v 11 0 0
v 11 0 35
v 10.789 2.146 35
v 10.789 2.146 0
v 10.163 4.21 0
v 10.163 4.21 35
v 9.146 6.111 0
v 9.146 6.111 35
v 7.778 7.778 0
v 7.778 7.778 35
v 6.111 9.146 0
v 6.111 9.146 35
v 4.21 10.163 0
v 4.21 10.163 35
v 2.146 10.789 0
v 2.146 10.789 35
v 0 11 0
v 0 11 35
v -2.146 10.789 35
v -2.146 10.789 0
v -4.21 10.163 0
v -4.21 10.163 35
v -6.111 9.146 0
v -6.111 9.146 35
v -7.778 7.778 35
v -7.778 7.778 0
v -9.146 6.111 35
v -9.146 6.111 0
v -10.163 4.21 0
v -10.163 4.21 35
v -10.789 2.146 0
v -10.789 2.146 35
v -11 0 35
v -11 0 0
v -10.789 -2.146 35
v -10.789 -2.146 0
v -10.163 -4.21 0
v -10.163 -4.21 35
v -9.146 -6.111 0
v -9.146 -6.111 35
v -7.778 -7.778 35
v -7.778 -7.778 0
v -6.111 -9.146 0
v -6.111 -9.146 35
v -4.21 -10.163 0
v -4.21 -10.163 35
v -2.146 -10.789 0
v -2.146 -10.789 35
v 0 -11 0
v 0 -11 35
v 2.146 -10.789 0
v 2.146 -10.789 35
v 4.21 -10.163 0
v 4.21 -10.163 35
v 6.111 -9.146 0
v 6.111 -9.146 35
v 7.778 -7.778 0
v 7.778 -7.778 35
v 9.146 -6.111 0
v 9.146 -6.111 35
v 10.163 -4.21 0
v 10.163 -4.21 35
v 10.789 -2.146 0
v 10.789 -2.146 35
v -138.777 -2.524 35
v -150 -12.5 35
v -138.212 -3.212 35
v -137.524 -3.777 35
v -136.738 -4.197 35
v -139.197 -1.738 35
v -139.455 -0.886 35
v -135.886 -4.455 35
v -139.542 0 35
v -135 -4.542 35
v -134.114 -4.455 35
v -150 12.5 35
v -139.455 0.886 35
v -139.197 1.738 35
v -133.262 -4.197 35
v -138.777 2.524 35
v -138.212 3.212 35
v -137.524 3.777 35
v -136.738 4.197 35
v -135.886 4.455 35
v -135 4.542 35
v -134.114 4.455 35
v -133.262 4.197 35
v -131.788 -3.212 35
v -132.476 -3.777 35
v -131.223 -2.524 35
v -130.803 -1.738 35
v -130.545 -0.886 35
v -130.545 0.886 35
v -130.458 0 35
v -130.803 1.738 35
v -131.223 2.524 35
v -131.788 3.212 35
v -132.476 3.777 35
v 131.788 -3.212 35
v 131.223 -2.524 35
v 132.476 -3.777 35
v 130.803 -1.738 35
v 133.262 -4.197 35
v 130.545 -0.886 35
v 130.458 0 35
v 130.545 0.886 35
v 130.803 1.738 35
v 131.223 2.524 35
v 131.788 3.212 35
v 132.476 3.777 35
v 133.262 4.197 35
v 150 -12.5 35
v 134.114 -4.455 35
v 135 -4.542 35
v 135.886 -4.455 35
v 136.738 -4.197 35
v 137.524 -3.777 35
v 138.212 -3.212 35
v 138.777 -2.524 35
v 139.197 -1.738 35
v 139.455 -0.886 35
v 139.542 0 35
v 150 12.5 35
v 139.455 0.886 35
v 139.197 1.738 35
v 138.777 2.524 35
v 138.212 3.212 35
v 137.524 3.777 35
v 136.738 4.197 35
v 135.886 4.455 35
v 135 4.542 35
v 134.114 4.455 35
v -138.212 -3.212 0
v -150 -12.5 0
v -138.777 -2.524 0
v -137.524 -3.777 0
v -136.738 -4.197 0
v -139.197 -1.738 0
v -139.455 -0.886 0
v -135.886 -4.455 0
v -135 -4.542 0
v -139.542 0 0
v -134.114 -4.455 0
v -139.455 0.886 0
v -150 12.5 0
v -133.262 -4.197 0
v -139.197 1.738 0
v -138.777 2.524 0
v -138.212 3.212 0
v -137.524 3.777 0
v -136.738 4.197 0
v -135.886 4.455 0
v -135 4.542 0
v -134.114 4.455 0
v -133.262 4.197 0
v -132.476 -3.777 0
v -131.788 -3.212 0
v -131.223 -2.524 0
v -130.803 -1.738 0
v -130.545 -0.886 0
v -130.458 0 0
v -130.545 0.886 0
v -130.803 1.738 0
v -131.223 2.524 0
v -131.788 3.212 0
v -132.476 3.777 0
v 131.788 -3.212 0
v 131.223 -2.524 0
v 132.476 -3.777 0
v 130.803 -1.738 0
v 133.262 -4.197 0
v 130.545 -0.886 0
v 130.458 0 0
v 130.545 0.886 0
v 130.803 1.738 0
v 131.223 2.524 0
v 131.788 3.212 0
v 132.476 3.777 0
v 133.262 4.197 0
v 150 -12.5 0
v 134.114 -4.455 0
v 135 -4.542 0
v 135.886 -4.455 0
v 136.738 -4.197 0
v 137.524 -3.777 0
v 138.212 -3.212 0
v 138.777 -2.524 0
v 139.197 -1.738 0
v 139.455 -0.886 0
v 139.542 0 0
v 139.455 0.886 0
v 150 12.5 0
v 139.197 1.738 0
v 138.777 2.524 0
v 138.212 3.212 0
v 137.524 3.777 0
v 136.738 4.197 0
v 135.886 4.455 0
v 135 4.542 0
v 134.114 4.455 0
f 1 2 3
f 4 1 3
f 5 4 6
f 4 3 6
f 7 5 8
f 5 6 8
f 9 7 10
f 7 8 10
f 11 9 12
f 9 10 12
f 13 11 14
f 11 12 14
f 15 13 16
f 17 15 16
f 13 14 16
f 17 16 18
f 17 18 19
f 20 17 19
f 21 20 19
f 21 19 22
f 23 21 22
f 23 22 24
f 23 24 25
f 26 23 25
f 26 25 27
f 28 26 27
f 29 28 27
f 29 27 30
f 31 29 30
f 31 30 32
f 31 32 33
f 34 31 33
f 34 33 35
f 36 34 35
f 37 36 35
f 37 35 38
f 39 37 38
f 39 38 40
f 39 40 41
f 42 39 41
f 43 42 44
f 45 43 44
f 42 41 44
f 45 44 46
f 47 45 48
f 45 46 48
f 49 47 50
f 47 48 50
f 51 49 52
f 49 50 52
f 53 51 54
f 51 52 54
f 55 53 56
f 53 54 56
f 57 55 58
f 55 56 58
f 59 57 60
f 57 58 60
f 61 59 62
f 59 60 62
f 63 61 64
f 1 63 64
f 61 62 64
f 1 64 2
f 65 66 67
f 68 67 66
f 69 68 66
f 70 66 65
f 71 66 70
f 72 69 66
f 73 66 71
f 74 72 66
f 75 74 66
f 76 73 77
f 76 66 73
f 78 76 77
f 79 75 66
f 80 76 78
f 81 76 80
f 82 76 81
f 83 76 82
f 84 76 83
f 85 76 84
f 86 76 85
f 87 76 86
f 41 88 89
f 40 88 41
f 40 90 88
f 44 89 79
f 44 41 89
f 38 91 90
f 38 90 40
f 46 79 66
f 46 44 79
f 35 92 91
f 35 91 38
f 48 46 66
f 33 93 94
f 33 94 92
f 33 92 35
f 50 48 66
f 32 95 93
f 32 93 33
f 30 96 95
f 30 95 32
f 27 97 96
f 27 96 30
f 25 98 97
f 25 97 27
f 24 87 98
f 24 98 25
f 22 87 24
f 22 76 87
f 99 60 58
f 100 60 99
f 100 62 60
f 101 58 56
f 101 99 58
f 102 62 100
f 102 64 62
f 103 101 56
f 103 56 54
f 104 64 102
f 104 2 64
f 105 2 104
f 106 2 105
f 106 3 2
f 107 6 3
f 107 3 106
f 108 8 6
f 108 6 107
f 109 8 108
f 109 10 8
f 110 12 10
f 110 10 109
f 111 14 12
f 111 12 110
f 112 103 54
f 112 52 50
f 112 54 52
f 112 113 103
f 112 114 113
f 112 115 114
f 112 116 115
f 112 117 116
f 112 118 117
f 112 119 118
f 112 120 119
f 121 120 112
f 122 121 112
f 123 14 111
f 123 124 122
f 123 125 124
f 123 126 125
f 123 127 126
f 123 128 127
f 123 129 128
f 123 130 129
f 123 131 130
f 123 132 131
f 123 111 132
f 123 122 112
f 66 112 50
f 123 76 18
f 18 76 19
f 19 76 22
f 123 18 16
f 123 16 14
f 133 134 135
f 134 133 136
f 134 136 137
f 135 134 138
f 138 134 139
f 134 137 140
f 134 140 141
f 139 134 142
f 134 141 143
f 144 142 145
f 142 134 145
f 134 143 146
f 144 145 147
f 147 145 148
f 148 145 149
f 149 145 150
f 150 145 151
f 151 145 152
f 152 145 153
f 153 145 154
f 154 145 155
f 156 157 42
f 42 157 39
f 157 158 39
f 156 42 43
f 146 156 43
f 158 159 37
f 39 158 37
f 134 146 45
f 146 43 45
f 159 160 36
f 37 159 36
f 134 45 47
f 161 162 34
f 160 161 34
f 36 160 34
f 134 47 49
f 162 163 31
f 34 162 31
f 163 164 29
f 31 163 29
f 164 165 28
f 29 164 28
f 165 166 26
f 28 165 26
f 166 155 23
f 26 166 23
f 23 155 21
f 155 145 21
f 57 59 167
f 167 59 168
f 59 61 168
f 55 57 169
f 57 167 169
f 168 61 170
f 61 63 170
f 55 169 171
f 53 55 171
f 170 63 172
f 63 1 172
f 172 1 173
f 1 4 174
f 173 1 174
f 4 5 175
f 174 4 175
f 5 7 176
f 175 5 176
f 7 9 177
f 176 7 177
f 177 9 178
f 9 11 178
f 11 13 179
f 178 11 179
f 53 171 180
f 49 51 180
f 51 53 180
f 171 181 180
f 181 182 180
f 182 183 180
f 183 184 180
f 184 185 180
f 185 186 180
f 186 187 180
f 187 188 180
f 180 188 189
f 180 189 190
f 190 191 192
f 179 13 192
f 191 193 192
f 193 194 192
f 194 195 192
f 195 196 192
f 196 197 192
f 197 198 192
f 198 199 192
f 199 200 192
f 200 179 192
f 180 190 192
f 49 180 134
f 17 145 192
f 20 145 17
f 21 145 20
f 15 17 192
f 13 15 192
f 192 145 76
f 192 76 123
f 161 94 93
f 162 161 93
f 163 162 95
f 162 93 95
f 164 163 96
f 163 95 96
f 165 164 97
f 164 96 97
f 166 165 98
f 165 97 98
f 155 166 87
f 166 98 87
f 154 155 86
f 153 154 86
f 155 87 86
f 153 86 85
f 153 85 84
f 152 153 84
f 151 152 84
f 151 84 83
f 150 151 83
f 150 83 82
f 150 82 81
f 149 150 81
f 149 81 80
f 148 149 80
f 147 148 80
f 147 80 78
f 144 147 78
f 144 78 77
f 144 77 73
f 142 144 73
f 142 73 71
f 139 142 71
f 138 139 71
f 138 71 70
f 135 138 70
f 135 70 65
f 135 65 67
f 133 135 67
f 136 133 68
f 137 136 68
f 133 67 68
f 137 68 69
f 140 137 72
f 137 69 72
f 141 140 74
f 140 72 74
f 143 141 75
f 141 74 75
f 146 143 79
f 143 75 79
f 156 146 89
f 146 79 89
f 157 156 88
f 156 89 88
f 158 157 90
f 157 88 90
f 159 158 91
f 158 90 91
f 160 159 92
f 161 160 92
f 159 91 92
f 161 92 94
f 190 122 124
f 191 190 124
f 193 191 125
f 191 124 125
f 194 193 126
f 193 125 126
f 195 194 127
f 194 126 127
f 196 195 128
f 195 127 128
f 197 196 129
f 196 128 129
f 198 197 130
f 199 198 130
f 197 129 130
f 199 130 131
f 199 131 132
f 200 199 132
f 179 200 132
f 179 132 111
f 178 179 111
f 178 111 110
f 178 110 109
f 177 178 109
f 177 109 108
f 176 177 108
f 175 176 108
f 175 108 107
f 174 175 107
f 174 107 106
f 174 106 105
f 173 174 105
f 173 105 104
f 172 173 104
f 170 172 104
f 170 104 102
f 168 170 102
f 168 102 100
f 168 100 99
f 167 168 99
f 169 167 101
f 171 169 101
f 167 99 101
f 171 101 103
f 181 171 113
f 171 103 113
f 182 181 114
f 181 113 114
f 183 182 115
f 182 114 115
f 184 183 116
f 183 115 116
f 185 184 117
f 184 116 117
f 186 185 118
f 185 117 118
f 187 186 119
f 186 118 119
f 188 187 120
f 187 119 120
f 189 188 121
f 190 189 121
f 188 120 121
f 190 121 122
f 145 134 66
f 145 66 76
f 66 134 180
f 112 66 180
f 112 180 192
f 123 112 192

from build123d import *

# Parameters (mm, degrees)
SKETCH1_W           = 300
SKETCH1_H           = 25
BOSS_EXTRUDE1_DEPTH = 35
SKETCH2_R           = 4.542391588
SKETCH2_R_2         = 11
CUT_EXTRUDE1_DEPTH  = 36


with BuildPart() as part:
    # Sketch1 → Boss-Extrude1 (new body)
    with BuildSketch(Plane.XY):
        Rectangle(SKETCH1_W, SKETCH1_H)
    extrude(amount=BOSS_EXTRUDE1_DEPTH)

    # Sketch2 → Cut-Extrude1 (cut, through all)
    with BuildSketch(Plane.XY.offset(35)):
        with Locations((-135, 0)):
            Circle(SKETCH2_R)
        Circle(SKETCH2_R_2)
        with Locations((135, 0)):
            Circle(SKETCH2_R)
    extrude(amount=-CUT_EXTRUDE1_DEPTH, mode=Mode.SUBTRACT)


solid = part.part
